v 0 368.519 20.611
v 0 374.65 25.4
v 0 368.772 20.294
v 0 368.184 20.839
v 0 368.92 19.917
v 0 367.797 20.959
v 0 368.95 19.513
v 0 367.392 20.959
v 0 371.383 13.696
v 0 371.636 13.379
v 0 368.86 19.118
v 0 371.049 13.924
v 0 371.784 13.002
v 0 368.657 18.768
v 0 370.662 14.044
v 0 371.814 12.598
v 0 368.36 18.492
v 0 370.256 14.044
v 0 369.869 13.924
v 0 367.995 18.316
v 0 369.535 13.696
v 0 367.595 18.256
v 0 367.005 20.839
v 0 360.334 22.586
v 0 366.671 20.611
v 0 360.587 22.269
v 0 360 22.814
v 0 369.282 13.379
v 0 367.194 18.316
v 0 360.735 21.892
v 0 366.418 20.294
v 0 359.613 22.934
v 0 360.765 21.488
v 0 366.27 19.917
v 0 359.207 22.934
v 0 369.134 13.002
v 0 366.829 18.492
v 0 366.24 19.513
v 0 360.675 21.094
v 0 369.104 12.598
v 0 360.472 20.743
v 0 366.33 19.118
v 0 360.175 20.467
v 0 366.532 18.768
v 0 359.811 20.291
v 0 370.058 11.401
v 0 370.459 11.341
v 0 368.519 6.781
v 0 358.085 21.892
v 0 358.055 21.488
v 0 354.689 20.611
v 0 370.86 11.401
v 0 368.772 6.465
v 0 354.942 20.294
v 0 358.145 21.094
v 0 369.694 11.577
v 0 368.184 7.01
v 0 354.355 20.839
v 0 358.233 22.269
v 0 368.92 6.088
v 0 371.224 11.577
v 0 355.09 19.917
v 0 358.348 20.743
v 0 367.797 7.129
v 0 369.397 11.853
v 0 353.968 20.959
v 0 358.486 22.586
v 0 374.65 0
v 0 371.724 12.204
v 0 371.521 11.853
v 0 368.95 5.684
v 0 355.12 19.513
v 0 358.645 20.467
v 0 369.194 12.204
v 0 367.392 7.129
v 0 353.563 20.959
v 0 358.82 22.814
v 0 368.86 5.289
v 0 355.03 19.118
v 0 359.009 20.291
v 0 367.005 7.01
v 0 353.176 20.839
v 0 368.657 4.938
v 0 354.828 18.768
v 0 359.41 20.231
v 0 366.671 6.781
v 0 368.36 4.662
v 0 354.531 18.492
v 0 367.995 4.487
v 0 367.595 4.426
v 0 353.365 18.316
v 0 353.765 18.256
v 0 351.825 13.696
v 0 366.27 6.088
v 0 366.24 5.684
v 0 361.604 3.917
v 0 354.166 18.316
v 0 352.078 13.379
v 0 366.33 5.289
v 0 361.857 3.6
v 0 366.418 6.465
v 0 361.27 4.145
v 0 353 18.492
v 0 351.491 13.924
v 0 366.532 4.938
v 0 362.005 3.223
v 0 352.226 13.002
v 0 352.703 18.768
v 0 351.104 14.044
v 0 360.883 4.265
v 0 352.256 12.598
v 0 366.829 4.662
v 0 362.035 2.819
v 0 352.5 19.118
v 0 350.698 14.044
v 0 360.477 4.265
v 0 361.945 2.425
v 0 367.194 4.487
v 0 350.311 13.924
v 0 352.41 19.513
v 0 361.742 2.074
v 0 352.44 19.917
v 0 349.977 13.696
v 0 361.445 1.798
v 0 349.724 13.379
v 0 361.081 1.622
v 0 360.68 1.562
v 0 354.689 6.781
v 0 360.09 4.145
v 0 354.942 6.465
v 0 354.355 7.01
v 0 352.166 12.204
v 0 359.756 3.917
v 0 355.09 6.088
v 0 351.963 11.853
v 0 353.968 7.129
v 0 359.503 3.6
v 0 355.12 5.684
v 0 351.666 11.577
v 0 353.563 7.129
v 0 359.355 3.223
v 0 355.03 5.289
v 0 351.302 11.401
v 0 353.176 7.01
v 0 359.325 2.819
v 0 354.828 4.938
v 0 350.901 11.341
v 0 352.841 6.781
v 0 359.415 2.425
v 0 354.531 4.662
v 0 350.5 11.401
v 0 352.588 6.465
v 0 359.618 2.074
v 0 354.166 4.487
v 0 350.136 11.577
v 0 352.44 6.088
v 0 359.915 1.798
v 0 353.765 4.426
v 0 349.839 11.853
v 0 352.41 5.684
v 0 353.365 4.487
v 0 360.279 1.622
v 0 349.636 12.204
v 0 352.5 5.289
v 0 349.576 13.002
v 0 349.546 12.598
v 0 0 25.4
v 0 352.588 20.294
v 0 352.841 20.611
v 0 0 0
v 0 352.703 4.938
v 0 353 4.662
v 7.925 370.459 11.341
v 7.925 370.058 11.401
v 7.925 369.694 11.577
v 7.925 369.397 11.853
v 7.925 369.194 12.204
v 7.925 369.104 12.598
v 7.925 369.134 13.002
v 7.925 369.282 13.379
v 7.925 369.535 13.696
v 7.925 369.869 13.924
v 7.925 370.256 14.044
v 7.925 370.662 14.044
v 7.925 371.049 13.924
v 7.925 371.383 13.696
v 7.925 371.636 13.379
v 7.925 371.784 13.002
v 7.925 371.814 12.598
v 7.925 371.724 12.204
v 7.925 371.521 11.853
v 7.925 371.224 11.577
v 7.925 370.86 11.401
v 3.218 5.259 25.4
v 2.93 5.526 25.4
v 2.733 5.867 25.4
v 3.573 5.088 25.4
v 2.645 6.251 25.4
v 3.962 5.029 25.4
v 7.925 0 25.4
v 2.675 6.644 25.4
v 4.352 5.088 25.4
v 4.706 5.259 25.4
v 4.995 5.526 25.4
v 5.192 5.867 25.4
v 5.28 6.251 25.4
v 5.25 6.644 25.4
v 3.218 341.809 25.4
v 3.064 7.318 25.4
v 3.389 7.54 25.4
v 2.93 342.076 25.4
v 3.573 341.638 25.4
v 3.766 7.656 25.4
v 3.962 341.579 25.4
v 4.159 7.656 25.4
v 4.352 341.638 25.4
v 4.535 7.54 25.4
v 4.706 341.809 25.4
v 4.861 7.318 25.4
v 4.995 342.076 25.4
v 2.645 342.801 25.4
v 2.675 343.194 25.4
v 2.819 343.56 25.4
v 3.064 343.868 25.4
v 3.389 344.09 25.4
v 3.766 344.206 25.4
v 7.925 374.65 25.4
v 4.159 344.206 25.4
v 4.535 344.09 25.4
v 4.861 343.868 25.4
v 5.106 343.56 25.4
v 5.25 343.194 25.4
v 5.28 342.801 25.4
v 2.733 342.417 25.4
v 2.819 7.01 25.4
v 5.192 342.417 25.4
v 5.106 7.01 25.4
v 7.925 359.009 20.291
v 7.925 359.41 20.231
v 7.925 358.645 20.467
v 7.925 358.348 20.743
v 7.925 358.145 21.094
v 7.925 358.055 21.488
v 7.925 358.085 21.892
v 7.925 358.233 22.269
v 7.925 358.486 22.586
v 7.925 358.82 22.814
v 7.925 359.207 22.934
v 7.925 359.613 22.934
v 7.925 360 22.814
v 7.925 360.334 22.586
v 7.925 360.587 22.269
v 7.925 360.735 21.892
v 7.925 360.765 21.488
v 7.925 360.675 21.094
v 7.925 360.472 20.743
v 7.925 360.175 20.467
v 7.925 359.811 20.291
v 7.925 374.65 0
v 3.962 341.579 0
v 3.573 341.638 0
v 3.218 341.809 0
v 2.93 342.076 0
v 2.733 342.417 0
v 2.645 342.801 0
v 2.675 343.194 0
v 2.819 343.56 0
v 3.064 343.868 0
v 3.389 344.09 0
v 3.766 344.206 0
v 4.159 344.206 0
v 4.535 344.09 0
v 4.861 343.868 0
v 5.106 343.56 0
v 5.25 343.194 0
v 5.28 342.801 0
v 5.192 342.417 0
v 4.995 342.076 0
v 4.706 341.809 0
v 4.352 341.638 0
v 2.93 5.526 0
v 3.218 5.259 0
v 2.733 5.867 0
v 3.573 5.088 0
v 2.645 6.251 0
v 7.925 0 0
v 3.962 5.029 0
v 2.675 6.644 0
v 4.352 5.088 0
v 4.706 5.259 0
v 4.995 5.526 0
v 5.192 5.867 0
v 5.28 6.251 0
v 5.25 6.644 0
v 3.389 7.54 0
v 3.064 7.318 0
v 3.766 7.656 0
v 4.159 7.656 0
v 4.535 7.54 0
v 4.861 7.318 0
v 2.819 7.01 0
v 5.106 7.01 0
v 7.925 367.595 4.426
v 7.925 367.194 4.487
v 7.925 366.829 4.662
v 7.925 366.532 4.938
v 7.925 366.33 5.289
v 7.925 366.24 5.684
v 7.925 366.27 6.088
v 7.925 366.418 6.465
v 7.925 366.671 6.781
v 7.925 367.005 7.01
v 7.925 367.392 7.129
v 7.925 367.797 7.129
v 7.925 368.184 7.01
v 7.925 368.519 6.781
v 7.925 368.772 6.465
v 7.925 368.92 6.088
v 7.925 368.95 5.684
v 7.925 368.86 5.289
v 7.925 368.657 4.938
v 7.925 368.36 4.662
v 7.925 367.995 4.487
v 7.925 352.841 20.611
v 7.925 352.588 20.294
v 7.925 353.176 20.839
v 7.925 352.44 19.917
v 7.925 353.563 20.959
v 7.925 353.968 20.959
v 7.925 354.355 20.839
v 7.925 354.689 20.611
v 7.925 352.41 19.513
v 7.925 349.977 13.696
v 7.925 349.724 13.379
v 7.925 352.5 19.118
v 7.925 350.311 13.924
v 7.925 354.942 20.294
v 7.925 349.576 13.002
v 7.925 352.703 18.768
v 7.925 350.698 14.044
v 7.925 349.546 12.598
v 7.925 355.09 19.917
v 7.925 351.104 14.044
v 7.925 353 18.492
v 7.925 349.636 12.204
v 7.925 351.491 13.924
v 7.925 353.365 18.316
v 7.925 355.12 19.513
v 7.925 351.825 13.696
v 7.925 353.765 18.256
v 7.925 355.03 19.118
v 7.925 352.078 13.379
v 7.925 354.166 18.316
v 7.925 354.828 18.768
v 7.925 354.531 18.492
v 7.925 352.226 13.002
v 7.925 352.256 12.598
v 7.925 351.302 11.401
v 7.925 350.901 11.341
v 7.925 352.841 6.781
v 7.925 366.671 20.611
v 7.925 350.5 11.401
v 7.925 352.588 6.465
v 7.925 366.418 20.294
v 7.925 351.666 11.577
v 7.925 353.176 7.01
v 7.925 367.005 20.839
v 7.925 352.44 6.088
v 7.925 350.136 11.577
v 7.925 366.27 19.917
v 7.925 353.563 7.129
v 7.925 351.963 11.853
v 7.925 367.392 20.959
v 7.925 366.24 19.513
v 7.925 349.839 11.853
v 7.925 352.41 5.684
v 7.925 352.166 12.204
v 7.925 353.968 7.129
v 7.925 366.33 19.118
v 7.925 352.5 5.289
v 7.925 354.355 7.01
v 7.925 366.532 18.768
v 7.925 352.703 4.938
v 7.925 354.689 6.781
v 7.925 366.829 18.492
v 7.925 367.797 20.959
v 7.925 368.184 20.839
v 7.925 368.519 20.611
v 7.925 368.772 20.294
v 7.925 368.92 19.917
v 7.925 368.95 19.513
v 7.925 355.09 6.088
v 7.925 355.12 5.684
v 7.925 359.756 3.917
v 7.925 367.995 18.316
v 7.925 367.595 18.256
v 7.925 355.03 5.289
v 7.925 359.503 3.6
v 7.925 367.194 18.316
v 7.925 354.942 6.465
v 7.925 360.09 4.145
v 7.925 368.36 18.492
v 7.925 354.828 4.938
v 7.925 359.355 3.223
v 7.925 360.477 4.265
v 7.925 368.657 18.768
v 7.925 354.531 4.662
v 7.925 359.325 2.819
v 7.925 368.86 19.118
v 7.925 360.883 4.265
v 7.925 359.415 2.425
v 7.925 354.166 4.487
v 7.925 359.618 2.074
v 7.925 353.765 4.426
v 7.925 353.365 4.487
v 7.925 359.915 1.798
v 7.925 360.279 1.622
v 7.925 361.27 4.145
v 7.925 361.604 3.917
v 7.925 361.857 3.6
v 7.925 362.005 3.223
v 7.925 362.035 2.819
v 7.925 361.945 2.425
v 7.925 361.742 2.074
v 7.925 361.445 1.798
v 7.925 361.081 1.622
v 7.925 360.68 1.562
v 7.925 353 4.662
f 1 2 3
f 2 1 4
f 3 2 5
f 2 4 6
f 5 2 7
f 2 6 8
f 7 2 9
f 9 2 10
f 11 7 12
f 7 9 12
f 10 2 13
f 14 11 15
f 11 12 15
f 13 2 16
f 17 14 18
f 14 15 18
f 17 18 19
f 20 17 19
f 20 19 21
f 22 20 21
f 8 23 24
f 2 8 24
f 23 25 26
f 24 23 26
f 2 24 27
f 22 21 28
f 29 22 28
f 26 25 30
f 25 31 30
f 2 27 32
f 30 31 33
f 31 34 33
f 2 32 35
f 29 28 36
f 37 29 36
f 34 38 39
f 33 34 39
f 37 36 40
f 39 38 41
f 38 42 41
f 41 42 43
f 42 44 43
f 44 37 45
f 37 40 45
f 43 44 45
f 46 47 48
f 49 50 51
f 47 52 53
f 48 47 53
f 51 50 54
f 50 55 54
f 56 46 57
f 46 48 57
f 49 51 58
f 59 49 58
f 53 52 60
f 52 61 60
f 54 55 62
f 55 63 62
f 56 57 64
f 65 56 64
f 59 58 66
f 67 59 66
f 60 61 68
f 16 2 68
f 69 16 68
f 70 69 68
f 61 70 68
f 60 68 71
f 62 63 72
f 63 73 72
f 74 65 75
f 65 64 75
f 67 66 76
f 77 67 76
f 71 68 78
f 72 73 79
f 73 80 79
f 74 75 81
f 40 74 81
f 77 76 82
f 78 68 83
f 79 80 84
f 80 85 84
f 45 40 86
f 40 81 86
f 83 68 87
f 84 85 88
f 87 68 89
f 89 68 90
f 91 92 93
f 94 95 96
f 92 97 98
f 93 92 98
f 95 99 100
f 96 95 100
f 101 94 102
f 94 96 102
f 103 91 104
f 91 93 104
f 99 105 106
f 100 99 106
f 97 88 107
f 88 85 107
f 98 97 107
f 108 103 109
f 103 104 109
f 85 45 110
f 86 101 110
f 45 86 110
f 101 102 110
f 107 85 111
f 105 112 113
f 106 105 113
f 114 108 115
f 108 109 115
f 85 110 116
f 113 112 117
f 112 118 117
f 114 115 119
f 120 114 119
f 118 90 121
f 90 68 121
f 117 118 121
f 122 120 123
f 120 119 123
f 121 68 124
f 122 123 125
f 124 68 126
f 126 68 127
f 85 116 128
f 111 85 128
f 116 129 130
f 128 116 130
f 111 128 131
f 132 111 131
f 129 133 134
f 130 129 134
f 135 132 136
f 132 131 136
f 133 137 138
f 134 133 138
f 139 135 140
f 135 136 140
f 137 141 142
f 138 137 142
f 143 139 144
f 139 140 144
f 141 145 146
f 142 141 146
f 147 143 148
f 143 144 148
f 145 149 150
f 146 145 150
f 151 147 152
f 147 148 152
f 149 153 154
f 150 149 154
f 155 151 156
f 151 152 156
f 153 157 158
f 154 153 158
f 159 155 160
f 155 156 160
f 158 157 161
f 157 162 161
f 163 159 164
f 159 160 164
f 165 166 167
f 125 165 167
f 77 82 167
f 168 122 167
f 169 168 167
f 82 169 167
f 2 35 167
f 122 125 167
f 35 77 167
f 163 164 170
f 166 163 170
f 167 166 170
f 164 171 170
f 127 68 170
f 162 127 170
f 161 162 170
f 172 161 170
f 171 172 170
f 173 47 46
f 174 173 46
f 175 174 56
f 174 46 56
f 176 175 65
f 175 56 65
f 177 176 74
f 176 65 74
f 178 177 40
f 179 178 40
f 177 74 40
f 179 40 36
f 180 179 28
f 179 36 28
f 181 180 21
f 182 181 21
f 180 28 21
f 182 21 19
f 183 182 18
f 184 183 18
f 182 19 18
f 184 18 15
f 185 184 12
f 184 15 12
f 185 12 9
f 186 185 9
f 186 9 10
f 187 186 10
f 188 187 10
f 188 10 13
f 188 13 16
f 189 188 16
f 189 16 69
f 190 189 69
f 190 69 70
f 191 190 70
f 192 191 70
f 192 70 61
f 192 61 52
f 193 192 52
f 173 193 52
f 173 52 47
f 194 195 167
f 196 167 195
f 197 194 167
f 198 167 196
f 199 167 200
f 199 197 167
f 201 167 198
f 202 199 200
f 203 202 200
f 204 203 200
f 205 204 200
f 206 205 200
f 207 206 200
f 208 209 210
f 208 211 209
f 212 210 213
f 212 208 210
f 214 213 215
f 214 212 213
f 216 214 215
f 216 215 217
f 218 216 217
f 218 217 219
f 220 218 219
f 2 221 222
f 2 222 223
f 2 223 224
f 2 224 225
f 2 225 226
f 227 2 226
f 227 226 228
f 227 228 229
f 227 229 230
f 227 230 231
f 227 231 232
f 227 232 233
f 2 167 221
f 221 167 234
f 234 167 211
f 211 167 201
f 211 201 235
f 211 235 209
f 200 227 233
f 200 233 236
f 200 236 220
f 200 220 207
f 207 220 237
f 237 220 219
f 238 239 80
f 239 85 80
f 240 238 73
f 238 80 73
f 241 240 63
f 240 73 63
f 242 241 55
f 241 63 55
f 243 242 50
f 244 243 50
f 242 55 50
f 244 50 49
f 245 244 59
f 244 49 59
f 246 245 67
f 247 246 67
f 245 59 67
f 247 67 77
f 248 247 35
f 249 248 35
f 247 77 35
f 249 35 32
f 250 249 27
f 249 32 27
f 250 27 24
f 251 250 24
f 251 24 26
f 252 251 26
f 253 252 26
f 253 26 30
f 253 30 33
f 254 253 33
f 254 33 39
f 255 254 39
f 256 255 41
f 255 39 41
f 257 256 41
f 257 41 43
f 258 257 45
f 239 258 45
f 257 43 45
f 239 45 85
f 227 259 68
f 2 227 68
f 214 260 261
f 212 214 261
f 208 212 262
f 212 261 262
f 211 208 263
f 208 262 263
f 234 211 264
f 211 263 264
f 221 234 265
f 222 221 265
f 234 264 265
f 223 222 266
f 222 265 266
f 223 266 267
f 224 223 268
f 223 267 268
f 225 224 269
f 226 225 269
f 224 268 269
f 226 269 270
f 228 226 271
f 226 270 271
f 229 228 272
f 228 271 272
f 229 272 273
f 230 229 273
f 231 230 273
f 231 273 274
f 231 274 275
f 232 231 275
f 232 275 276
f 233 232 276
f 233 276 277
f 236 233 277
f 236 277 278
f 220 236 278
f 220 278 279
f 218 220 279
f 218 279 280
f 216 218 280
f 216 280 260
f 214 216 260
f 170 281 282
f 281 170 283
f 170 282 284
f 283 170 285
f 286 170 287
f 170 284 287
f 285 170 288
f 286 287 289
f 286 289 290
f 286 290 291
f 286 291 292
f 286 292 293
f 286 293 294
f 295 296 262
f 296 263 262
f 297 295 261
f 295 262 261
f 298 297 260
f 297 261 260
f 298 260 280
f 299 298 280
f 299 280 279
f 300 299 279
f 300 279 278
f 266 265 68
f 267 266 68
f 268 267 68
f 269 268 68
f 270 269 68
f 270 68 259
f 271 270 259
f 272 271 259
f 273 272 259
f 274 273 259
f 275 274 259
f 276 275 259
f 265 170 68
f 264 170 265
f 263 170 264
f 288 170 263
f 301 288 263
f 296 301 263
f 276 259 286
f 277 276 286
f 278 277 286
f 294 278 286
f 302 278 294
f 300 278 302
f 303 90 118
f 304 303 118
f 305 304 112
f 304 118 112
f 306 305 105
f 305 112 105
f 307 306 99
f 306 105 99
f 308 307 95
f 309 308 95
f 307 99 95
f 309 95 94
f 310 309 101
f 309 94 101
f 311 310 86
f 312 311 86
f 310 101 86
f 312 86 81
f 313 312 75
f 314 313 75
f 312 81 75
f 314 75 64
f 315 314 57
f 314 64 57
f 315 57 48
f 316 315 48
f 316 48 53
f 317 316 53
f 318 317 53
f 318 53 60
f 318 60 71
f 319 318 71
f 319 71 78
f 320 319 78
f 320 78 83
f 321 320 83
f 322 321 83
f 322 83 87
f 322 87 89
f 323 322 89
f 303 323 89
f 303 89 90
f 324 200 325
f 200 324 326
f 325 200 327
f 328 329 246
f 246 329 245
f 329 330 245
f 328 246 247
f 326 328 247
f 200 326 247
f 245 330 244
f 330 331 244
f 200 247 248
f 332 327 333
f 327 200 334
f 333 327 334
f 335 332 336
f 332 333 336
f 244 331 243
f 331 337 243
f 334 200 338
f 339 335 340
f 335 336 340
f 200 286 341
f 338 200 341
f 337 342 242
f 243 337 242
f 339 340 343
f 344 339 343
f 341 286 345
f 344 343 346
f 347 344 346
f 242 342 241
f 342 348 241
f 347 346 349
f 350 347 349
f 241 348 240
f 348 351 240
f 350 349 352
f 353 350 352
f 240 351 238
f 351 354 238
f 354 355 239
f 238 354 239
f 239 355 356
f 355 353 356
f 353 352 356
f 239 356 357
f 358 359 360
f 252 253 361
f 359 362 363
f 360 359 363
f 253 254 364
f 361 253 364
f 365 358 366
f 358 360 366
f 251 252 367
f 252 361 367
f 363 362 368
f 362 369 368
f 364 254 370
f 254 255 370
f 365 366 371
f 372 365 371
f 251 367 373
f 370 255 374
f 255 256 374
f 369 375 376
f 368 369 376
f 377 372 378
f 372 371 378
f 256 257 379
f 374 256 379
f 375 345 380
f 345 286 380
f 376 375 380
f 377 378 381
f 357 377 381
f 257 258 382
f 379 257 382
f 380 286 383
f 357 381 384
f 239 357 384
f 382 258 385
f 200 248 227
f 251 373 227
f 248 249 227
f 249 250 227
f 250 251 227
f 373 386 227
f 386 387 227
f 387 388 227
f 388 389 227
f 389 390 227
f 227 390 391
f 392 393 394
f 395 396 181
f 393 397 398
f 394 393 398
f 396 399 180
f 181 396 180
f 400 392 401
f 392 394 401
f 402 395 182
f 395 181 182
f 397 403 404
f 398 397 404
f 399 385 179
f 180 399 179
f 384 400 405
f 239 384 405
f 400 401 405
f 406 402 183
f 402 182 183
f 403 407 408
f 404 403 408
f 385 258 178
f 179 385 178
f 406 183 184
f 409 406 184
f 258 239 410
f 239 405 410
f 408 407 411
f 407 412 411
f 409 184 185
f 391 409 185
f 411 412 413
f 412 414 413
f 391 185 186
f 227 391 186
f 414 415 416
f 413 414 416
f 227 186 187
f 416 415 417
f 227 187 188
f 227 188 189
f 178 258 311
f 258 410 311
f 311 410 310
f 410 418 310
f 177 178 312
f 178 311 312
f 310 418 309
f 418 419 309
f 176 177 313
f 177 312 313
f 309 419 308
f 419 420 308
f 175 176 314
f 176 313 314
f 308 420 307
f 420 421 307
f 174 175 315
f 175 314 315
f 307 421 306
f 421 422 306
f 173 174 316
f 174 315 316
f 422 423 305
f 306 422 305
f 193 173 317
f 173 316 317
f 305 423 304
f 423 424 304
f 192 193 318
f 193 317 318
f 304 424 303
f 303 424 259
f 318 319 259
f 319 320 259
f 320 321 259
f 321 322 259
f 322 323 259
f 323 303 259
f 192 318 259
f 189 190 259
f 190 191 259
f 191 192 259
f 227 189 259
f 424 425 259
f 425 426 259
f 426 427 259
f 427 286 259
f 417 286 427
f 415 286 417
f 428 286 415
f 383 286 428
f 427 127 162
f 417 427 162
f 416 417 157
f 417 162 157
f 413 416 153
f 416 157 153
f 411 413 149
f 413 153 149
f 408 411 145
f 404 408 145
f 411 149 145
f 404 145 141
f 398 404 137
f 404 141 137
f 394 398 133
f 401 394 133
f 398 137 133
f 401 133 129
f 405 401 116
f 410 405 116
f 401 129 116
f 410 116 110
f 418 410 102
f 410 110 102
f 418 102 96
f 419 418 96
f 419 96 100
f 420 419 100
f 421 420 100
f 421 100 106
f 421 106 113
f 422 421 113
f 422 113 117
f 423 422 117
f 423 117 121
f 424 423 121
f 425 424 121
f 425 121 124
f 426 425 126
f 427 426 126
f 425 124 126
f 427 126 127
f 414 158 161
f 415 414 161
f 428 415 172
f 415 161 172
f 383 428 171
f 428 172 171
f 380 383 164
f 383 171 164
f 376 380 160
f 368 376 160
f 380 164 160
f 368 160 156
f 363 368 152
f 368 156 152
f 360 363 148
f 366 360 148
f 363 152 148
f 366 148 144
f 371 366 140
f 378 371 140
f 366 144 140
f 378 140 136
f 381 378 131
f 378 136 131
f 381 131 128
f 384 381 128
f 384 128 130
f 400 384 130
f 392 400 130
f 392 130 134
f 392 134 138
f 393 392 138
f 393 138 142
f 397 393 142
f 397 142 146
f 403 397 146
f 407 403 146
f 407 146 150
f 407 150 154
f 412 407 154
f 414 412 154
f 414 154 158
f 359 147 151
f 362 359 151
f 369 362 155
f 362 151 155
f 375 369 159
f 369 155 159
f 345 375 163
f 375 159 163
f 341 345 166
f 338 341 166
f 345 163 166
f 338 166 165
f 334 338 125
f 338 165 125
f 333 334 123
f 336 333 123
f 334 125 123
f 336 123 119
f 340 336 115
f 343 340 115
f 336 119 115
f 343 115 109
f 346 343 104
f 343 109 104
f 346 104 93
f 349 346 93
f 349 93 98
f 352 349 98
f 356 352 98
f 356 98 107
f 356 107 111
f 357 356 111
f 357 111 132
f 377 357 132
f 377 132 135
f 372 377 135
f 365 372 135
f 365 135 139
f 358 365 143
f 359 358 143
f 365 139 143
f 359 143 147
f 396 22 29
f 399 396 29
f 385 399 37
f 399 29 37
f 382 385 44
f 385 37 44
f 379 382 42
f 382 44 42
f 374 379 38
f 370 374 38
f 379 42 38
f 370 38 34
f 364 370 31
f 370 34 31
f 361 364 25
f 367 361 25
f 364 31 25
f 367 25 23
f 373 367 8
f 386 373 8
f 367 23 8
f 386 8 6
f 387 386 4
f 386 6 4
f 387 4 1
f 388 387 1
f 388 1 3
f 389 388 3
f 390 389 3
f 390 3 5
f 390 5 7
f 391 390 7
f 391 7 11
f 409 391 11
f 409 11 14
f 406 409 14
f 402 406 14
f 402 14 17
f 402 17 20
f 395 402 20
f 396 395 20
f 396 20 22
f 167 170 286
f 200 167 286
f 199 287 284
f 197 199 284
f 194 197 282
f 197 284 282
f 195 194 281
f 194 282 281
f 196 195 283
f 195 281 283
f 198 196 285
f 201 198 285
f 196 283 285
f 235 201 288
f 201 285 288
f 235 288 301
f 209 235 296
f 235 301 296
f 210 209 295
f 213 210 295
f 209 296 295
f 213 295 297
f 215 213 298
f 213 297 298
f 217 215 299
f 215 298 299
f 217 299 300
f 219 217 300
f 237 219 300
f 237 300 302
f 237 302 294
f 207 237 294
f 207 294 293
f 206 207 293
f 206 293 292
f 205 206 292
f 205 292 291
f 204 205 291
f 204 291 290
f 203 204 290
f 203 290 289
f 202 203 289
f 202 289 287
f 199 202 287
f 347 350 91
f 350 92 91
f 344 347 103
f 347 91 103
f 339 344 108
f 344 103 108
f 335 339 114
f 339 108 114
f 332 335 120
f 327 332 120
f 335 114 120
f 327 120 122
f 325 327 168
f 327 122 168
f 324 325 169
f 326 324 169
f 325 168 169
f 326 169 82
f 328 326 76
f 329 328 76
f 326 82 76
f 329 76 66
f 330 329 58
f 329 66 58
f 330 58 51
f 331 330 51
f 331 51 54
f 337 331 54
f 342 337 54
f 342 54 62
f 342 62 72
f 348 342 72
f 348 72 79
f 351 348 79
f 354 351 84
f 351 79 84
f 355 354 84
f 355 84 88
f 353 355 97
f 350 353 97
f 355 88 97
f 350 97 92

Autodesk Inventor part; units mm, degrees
ref_plane "YZ Plane" through (0, 0, 0) normal (1, 0, 0) x (0, 1, 0)
ref_plane "XZ Plane" through (0, 0, 0) normal (0, 1, 0) x (-1, 0, 0)
ref_plane "XY Plane" through (0, 0, 0) normal (0, 0, 1) x (1, 0, 0)
sketch "Sketch1" plane through (0, 0, 0) normal (0, 0, 1) x (1, 0, 0)
  line L0 (0, 0) -> (7.9248, 0)
  line L1 (7.9248, 0) -> (7.9248, 374.65)
  line L2 (7.9248, 374.65) -> (0, 374.65)
  line L3 (0, 374.65) -> (0, 0)
  dimension "d0" = 7.9248
  dimension "d1" = 374.65
extrude "Extrusion1" add sketch "Sketch1" along normal blind 25.4
sketch "Sketch2" plane through (0, 0, 25.4) normal (0, 0, 1) x (1, 0, 0)
  line L0 (0, 0) -> (7.9248, 0) projected
  line L1 (3.9624, 0) -> (3.9624, 6.35)
  circle A0 centre (3.9624, 6.35) radius 1.778
  line L2 (7.9248, 374.65) -> (0, 374.65) projected
  line L3 (3.9624, 374.65) -> (3.9624, 342.9)
  circle A1 centre (3.9624, 342.9) radius 1.778
  dimension "d4" = 6.35
  dimension "d5" = 3.556
  dimension "d6" = 31.75
  dimension "d7" = 3.556
hole "Hole1" at (3.9624, 342.9, 25.4) at (3.9624, 6.35, 25.4) direction (0, 0, -1) diameter 2.6416 depth 25.4 tip angle 118 thread size "6-32 UNC" class "2B" standard "ANSI Unified Screw Threads"
sketch "Sketch3" plane through (7.9248, 0, 0) normal (1, 0, 0) x (0, 0, -1)
  line L0 (0, 374.65) -> (-25.4, 374.65) projected
  circle A0 centre (-12.7, 360.68) radius 9.779
  point P0 (0, 0)
  point P1 (-21.59, 359.41)
  point P2 (-12.7, 370.459)
  point P3 (-19.6148, 367.5948)
  point P4 (-22.479, 360.68)
  point P5 (-19.6148, 353.7652)
  point P6 (-12.7, 350.901)
  point P7 (-5.7852, 353.7652)
  point P8 (-2.921, 360.68)
  point P9 (-5.7852, 367.5948)
  dimension "d36" = 19.558
  dimension "d35" = 13.97
  dimension "d39" = 360
hole "Hole2" at (7.9248, 359.41, 21.59) at (7.9248, 367.5948, 19.6148) at (7.9248, 370.459, 12.7) at (7.9248, 367.5948, 5.7852) at (7.9248, 360.68, 2.921) at (7.9248, 353.7652, 5.7852) at (7.9248, 350.901, 12.7) at (7.9248, 353.7652, 19.6148) direction (-1, 0, 0) diameter 2.7178 depth 25.4 tip angle 118
properties part number "GlyphPlateLeftSide"
